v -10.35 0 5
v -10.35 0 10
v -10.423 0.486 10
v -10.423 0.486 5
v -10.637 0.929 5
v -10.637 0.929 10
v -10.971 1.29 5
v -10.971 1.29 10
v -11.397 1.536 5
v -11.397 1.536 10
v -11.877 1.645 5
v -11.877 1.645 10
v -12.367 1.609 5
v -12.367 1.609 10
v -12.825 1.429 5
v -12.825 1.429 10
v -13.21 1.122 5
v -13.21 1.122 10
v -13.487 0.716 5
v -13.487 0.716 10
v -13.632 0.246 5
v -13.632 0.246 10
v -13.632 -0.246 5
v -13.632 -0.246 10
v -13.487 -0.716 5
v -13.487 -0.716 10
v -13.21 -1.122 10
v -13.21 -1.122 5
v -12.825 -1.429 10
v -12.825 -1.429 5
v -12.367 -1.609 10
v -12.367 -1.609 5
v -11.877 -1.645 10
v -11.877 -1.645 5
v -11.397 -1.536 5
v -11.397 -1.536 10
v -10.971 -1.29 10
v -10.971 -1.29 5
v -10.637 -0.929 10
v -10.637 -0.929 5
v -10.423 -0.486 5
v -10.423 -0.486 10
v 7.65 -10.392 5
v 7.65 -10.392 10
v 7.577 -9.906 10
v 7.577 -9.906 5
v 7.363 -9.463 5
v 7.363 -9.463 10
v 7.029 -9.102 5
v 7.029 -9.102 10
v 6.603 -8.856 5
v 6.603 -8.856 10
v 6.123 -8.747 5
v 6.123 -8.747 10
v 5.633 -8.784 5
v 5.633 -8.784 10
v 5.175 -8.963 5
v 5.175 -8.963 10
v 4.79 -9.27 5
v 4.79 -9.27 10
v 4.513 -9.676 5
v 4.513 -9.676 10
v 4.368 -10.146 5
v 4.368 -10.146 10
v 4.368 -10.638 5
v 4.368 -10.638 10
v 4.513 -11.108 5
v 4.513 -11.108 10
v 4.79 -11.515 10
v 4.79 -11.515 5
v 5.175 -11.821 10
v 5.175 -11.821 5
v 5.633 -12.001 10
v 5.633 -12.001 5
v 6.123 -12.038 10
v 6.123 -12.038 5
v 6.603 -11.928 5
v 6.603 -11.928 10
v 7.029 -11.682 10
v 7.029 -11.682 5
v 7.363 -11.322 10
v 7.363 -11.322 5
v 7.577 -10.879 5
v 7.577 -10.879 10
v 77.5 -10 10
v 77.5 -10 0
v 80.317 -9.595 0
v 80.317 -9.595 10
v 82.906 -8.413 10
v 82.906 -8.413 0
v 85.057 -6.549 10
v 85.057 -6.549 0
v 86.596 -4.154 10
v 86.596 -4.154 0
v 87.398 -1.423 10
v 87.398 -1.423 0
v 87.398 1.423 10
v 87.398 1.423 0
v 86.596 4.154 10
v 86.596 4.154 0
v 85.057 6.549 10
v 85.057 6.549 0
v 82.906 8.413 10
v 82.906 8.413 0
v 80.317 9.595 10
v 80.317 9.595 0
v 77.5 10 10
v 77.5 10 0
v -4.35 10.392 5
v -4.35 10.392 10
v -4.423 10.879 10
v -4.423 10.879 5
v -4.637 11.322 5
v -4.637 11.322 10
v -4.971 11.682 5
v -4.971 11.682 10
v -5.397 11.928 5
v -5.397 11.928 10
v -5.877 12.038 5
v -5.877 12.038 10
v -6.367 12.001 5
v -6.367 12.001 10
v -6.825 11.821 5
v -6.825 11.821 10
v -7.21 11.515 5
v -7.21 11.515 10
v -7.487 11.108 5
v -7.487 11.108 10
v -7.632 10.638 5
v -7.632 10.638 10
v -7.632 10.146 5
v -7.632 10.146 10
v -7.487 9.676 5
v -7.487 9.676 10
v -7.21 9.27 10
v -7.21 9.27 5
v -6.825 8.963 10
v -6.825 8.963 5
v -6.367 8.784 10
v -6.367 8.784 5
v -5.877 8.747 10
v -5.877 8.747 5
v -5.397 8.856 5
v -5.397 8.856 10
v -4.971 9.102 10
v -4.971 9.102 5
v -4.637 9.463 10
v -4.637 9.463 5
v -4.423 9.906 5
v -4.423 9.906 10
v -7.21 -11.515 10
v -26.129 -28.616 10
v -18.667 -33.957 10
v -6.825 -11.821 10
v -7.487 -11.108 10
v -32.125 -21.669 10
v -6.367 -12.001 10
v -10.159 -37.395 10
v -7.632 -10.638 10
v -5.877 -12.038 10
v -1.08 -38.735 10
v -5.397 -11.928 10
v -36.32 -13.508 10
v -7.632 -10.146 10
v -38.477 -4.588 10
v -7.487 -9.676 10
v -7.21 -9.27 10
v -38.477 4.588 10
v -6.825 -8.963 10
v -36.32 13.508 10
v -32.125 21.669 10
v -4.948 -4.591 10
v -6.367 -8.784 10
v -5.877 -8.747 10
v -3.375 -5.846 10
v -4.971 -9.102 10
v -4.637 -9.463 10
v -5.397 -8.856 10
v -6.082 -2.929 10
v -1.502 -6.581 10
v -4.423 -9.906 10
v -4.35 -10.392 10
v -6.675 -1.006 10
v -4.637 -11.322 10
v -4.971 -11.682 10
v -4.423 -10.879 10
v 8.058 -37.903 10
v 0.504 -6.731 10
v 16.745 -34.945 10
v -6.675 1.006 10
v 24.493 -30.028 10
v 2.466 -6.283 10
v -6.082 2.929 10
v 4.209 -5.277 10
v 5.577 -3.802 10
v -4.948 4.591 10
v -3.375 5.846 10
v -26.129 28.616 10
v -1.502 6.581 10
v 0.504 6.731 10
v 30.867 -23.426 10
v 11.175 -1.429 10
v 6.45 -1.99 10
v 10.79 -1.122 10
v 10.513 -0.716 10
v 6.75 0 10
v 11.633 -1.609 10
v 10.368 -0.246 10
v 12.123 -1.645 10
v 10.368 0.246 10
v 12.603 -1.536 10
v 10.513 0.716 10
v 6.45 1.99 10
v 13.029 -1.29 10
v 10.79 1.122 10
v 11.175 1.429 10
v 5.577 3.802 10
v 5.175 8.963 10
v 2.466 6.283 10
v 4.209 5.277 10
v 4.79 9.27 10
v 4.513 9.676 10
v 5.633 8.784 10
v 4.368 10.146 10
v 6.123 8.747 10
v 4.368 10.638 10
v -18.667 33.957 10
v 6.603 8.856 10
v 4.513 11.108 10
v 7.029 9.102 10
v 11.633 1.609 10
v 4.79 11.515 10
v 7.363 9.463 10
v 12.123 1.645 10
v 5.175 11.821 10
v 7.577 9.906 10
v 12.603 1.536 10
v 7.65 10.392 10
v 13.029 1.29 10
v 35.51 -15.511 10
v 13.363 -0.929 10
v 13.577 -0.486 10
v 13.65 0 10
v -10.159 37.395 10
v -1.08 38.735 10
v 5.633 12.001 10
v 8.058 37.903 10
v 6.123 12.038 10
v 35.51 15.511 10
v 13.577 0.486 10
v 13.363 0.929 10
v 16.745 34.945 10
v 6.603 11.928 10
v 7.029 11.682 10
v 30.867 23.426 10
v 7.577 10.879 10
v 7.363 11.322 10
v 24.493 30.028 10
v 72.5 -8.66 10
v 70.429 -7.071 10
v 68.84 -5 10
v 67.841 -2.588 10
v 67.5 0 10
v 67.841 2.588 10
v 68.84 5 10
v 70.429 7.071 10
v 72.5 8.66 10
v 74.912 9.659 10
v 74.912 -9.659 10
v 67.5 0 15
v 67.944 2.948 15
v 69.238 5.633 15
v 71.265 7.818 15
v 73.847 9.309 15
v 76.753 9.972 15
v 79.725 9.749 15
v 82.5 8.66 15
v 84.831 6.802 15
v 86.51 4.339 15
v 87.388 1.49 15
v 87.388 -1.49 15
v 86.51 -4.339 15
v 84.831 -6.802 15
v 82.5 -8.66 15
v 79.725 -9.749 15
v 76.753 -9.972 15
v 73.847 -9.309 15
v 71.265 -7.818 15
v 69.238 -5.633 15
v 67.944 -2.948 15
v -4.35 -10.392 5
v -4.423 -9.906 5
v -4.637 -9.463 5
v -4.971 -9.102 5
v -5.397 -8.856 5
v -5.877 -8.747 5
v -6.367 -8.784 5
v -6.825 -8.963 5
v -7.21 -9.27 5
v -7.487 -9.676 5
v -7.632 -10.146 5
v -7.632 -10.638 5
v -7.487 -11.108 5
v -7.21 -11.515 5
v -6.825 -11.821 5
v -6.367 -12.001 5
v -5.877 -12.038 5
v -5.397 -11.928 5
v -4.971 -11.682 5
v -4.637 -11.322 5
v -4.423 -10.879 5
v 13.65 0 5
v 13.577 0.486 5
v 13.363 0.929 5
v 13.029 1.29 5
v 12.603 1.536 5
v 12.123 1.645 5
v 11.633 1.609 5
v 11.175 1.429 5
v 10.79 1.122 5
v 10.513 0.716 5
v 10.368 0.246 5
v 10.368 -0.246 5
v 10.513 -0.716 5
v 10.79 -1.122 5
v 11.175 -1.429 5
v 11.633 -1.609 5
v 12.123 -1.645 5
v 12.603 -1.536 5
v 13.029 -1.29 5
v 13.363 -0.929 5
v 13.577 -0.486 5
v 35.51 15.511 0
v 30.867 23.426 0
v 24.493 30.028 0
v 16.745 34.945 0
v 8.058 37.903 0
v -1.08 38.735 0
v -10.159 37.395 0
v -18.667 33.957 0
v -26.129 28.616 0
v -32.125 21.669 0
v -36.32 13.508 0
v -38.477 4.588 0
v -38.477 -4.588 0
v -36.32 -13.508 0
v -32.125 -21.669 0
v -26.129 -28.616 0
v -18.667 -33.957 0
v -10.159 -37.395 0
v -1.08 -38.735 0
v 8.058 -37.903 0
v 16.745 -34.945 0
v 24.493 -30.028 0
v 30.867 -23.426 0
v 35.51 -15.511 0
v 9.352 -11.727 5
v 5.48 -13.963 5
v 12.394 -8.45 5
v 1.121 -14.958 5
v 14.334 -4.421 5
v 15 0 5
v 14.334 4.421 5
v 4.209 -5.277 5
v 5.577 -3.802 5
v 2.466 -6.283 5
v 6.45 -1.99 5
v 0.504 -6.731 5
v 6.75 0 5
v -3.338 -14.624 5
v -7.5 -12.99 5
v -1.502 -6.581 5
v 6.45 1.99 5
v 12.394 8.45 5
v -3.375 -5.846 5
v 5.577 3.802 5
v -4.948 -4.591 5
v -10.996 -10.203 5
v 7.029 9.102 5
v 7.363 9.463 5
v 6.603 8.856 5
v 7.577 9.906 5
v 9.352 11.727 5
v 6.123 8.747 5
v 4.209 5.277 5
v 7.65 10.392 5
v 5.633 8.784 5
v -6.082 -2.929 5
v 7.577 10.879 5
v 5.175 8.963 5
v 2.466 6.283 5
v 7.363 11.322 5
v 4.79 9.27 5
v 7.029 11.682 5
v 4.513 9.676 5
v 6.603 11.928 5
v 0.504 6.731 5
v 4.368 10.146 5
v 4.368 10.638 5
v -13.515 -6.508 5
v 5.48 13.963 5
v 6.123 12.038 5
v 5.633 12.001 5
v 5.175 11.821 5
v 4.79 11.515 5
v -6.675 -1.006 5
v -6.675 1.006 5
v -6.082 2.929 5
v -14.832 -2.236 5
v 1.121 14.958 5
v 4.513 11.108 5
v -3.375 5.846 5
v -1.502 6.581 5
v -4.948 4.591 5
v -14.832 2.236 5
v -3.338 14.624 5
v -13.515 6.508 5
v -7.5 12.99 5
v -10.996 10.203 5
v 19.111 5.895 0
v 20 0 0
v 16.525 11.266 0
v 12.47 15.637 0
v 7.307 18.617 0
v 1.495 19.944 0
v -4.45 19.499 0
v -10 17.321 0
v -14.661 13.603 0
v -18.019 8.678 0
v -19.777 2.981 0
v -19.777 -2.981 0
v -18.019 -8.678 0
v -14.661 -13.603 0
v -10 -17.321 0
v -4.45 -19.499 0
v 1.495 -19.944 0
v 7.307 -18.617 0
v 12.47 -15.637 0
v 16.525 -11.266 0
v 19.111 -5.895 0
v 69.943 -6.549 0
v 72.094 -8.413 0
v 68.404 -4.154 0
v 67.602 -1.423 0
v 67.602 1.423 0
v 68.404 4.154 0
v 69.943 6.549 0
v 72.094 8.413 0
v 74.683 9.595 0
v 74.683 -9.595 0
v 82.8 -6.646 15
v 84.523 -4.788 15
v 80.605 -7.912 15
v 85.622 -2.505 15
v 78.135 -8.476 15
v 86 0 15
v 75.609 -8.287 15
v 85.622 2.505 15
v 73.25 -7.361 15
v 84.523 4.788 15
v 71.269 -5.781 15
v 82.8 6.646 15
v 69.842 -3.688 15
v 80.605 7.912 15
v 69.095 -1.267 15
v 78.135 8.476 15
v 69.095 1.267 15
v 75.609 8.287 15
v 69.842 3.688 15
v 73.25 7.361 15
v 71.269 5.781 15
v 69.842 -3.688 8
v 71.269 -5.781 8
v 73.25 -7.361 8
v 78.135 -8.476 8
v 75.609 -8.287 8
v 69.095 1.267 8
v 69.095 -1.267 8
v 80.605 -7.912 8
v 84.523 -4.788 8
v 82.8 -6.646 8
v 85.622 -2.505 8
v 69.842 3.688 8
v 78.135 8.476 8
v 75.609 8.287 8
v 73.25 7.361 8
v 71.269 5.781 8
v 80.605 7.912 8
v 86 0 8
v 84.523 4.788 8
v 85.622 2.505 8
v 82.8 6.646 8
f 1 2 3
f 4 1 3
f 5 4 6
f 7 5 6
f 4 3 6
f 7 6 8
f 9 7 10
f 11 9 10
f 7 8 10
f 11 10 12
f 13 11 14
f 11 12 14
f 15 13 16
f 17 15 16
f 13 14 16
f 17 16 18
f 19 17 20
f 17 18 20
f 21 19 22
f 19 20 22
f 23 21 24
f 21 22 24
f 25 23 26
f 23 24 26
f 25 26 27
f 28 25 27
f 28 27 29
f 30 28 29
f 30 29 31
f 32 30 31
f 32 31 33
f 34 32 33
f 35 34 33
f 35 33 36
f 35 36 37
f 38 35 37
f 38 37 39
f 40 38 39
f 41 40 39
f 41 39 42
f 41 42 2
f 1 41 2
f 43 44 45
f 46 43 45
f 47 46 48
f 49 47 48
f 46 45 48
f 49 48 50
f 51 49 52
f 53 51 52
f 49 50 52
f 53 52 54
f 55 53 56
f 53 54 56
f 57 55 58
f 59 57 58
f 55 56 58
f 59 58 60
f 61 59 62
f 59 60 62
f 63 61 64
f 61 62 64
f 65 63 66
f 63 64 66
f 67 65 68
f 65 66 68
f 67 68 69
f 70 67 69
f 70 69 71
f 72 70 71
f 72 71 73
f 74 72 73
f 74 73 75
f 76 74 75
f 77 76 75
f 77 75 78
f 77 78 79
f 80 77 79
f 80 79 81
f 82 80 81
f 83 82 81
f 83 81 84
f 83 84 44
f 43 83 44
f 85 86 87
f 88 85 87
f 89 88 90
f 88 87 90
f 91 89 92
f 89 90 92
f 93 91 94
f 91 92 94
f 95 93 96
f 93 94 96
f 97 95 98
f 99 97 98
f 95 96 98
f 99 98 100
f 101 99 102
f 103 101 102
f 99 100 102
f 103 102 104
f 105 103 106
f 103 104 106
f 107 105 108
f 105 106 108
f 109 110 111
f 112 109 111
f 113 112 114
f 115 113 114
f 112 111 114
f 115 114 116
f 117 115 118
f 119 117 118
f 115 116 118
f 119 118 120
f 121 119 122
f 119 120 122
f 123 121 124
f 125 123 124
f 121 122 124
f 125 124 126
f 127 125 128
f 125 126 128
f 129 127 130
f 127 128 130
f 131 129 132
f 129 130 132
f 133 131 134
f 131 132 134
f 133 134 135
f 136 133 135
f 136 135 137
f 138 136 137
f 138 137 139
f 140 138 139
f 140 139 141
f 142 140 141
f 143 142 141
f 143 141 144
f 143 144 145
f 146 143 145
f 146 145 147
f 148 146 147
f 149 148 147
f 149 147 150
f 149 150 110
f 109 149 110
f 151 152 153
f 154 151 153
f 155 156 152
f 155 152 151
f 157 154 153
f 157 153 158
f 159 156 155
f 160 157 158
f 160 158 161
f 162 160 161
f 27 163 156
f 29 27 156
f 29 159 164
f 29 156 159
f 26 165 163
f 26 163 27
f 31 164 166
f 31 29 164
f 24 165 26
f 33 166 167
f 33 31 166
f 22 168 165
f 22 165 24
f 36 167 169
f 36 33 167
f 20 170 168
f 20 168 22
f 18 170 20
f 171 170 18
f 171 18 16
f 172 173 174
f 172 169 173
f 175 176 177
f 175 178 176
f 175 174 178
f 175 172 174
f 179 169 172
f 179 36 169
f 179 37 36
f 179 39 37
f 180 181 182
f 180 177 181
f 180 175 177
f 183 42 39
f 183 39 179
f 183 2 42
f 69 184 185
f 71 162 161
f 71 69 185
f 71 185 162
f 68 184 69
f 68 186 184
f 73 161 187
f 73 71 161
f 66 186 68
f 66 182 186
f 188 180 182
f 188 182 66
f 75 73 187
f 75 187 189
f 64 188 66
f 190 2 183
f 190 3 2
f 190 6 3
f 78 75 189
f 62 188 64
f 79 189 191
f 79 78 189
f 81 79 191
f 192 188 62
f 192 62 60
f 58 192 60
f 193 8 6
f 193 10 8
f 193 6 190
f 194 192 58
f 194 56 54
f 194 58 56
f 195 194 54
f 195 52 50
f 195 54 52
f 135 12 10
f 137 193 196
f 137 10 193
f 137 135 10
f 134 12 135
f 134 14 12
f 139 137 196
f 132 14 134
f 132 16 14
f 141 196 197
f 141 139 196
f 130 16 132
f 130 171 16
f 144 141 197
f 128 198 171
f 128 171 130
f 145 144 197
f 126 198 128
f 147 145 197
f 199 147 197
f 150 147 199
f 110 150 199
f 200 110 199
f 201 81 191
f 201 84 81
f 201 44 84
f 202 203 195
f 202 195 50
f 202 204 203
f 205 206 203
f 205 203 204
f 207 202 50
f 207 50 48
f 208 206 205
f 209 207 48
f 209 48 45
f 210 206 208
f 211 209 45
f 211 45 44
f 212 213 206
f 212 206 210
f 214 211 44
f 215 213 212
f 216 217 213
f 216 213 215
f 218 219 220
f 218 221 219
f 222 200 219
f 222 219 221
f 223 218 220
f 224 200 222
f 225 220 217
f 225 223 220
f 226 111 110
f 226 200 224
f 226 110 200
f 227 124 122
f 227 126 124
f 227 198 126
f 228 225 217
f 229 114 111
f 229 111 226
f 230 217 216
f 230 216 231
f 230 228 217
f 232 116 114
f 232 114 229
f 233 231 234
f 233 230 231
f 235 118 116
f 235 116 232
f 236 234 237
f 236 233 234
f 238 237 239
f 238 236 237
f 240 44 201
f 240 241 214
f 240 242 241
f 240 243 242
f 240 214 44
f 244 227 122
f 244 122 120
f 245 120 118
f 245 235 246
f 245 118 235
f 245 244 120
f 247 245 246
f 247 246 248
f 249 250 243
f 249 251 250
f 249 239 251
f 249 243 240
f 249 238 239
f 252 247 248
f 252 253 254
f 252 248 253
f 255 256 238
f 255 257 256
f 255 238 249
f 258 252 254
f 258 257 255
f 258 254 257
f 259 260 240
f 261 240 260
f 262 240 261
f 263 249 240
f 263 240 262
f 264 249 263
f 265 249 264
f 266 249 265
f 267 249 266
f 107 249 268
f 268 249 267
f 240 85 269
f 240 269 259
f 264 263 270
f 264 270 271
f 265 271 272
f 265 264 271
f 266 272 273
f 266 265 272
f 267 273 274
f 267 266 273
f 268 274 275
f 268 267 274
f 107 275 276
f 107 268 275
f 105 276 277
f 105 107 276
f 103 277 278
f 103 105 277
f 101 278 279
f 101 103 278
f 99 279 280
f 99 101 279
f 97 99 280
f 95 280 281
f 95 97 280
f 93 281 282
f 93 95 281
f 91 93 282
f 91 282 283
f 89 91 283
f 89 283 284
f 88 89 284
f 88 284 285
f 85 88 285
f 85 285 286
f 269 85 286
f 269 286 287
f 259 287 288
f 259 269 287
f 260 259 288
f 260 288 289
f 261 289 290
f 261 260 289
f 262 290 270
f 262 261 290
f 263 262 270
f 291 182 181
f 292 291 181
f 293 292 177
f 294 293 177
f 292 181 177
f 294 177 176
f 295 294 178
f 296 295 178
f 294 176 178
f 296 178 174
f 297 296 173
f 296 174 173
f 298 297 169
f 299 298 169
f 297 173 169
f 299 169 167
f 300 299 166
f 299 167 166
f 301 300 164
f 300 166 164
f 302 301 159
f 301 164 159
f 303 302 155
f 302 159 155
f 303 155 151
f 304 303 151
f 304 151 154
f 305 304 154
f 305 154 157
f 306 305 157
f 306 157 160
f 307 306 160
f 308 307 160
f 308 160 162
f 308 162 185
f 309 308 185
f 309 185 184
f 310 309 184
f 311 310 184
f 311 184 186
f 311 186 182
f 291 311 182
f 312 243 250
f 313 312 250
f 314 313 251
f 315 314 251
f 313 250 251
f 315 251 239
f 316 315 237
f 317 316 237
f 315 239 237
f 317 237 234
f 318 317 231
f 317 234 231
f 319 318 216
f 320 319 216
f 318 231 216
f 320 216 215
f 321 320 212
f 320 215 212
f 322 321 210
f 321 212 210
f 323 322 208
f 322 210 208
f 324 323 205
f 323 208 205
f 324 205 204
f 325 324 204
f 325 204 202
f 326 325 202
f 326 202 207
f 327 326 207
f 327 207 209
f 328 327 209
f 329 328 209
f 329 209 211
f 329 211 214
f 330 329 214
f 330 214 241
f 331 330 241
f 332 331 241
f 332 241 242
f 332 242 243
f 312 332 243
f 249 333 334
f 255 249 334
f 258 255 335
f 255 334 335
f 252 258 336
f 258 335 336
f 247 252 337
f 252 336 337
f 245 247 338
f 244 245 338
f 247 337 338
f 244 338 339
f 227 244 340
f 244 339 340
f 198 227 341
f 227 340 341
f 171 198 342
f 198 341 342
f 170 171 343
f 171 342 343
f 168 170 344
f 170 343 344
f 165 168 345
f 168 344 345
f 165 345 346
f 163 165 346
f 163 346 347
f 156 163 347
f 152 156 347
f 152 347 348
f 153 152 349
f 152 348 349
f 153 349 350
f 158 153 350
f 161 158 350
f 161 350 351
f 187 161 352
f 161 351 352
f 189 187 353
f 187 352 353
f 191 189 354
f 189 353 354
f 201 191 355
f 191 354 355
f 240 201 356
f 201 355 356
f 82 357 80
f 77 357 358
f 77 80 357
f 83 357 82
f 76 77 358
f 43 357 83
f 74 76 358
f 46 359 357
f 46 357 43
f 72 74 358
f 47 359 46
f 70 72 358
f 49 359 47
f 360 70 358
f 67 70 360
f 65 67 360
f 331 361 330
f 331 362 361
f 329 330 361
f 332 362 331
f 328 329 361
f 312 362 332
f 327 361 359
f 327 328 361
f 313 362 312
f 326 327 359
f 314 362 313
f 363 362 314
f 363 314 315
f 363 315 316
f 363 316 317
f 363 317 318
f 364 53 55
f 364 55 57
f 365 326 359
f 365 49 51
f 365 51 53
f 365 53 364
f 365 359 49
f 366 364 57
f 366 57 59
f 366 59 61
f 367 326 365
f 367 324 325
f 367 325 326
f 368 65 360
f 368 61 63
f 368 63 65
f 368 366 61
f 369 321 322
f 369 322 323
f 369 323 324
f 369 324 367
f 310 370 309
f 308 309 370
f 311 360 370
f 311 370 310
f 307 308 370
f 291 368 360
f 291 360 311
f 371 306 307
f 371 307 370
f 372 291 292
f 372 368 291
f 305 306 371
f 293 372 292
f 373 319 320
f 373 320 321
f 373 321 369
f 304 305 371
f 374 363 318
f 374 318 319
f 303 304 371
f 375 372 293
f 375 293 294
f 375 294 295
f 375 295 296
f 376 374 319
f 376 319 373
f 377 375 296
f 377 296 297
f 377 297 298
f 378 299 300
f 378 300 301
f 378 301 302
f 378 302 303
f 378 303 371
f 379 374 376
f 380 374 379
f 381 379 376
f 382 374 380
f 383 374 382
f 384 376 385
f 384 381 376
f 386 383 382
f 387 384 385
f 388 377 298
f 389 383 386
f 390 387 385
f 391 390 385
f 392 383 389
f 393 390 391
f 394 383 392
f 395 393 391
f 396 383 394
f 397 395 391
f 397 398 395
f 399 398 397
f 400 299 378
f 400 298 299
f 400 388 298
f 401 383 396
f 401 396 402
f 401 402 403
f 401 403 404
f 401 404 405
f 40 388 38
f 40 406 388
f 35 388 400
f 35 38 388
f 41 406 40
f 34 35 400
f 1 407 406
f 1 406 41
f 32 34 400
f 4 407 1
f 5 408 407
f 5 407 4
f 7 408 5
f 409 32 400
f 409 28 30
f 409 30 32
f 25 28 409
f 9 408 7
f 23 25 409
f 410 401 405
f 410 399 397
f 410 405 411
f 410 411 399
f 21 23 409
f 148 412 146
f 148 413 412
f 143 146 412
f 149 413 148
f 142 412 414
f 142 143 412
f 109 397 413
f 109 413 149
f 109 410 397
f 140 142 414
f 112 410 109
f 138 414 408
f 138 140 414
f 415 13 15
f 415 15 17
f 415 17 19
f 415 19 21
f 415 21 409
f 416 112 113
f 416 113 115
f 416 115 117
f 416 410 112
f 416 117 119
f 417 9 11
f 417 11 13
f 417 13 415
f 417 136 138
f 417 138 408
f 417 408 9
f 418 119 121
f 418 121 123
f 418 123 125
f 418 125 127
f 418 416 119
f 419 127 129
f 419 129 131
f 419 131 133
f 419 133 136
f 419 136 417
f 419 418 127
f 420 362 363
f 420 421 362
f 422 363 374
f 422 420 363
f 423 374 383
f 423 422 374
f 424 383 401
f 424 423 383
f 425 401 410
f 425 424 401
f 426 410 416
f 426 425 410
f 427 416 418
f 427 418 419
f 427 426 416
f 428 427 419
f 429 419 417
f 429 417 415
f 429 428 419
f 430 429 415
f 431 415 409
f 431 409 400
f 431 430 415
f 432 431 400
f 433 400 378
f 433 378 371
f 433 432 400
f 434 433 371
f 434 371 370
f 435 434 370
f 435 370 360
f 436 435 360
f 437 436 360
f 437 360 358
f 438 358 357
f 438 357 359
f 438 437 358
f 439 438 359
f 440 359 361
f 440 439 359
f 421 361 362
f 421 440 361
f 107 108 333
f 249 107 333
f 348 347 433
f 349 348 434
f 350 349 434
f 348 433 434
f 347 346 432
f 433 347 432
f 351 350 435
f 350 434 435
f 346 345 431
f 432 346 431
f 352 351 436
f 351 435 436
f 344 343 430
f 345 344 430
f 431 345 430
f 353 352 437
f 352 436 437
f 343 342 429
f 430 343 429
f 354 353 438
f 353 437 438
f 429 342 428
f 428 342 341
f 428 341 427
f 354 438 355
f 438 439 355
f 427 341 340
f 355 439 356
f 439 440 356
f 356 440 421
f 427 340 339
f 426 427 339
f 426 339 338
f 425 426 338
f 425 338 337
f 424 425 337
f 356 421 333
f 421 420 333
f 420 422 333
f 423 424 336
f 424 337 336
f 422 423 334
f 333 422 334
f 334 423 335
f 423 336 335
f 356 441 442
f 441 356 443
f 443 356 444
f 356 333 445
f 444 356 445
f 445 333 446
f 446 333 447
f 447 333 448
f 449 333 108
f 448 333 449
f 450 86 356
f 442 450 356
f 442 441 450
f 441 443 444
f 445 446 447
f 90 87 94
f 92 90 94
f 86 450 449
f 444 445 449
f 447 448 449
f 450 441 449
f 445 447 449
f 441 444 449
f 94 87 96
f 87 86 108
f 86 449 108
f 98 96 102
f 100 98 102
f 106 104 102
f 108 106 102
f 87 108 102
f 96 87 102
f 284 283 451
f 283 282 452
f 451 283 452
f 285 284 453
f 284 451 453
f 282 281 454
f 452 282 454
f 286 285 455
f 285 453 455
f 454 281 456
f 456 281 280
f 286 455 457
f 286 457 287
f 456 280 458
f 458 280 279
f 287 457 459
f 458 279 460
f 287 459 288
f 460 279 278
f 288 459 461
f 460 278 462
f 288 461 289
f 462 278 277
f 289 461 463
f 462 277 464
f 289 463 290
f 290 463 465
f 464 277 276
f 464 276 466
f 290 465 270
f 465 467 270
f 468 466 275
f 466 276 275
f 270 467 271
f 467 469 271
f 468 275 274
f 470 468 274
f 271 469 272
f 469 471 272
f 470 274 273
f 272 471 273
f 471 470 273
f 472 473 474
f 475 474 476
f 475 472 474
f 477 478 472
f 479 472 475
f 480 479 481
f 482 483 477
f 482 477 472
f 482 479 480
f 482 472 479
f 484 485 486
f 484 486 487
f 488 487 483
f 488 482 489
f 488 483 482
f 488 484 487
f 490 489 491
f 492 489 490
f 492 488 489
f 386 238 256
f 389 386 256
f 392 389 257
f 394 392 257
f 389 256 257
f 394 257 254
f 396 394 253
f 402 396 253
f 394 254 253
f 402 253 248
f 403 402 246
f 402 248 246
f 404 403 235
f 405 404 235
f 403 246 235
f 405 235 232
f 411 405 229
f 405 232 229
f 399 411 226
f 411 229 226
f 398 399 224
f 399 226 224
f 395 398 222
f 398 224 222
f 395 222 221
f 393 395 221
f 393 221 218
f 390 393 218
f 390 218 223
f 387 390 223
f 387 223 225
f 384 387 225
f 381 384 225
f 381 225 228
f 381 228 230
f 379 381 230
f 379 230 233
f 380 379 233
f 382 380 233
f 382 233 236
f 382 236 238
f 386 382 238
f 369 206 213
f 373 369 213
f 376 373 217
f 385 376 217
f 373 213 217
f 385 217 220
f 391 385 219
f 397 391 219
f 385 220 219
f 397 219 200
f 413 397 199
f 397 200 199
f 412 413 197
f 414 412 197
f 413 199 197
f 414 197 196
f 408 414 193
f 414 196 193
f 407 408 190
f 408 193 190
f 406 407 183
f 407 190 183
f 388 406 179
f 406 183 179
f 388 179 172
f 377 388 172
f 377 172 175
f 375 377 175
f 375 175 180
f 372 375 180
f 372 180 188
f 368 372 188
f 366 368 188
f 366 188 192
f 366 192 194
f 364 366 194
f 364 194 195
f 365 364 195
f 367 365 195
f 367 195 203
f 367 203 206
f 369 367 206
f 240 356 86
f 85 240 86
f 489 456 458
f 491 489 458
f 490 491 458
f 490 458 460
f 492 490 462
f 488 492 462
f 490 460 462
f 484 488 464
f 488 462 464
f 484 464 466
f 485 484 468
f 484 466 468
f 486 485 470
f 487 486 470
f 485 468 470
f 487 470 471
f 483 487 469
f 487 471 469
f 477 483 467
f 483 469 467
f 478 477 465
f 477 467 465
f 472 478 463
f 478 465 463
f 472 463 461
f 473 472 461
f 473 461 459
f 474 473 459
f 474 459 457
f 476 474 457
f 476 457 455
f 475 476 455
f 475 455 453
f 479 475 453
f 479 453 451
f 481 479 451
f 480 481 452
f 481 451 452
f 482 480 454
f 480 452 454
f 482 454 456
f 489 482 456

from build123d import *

# Parameters (mm, degrees)
BOSS_EXTRUDE1_DEPTH = 10
SKETCH2_R           = 6.75
SKETCH2_R_2         = 1.65
CUT_EXTRUDE1_DEPTH  = 97.21752699
SKETCH3_W           = 15
SKETCH3_H           = 5
SKETCH4_R           = 10
BOSS_EXTRUDE2_DEPTH = 15
SKETCH5_R           = 8.5
CUT_EXTRUDE2_DEPTH  = 7


with BuildPart() as part:
    # Sketch1 → Boss-Extrude1 (new body)
    with BuildSketch(Plane.XY):
        with BuildLine():
            ThreePointArc((35.510171199, 15.510971646), (-38.75, 0), (35.510171199, -15.510971646))
            Line((35.510171199, -15.510971646), (77.5, -10))
            ThreePointArc((77.5, -10), (87.5, 0), (77.5, 10))
            Line((77.5, 10), (35.510171199, 15.510971646))
        make_face()
    extrude(amount=BOSS_EXTRUDE1_DEPTH)

    # Sketch2 → Cut-Extrude1 (cut, through all)
    with BuildSketch(Plane.XY.offset(10)):
        Circle(SKETCH2_R)
        with Locations((12, 0)):
            Circle(SKETCH2_R_2)
        with Locations((6, -10.392304845)):
            Circle(SKETCH2_R_2)
        with Locations((-6, -10.392304845)):
            Circle(SKETCH2_R_2)
        with Locations((-12, 0)):
            Circle(SKETCH2_R_2)
        with Locations((-6, 10.392304845)):
            Circle(SKETCH2_R_2)
        with Locations((6, 10.392304845)):
            Circle(SKETCH2_R_2)
    extrude(amount=-CUT_EXTRUDE1_DEPTH, mode=Mode.SUBTRACT)

    # Sketch3 → Cut-Revolve1 (revolve, cut)
    with BuildSketch(Plane(origin=(0, 0, 0), x_dir=(1, 0, 0), z_dir=(0, 1, 0))):
        with Locations((7.5, -2.5)):
            Rectangle(SKETCH3_W, SKETCH3_H)
        Polygon((15, -5), (20, 0), (15, 0), align=None)
    revolve(axis=Axis((0, 0, 0), (0, 0, 1)), mode=Mode.SUBTRACT)

    # Sketch4 → Boss-Extrude2 (add)
    with BuildSketch(Plane(origin=(0, 0, 0), x_dir=(-1, 0, 0), z_dir=(0, 0, -1))):
        with Locations((-77.5, 0)):
            Circle(SKETCH4_R)
    extrude(amount=-BOSS_EXTRUDE2_DEPTH)

    # Sketch5 → Cut-Extrude2 (cut)
    with BuildSketch(Plane.XY.offset(15)):
        with Locations((77.5, 0)):
            Circle(SKETCH5_R)
    extrude(amount=-CUT_EXTRUDE2_DEPTH, mode=Mode.SUBTRACT)


solid = part.part
